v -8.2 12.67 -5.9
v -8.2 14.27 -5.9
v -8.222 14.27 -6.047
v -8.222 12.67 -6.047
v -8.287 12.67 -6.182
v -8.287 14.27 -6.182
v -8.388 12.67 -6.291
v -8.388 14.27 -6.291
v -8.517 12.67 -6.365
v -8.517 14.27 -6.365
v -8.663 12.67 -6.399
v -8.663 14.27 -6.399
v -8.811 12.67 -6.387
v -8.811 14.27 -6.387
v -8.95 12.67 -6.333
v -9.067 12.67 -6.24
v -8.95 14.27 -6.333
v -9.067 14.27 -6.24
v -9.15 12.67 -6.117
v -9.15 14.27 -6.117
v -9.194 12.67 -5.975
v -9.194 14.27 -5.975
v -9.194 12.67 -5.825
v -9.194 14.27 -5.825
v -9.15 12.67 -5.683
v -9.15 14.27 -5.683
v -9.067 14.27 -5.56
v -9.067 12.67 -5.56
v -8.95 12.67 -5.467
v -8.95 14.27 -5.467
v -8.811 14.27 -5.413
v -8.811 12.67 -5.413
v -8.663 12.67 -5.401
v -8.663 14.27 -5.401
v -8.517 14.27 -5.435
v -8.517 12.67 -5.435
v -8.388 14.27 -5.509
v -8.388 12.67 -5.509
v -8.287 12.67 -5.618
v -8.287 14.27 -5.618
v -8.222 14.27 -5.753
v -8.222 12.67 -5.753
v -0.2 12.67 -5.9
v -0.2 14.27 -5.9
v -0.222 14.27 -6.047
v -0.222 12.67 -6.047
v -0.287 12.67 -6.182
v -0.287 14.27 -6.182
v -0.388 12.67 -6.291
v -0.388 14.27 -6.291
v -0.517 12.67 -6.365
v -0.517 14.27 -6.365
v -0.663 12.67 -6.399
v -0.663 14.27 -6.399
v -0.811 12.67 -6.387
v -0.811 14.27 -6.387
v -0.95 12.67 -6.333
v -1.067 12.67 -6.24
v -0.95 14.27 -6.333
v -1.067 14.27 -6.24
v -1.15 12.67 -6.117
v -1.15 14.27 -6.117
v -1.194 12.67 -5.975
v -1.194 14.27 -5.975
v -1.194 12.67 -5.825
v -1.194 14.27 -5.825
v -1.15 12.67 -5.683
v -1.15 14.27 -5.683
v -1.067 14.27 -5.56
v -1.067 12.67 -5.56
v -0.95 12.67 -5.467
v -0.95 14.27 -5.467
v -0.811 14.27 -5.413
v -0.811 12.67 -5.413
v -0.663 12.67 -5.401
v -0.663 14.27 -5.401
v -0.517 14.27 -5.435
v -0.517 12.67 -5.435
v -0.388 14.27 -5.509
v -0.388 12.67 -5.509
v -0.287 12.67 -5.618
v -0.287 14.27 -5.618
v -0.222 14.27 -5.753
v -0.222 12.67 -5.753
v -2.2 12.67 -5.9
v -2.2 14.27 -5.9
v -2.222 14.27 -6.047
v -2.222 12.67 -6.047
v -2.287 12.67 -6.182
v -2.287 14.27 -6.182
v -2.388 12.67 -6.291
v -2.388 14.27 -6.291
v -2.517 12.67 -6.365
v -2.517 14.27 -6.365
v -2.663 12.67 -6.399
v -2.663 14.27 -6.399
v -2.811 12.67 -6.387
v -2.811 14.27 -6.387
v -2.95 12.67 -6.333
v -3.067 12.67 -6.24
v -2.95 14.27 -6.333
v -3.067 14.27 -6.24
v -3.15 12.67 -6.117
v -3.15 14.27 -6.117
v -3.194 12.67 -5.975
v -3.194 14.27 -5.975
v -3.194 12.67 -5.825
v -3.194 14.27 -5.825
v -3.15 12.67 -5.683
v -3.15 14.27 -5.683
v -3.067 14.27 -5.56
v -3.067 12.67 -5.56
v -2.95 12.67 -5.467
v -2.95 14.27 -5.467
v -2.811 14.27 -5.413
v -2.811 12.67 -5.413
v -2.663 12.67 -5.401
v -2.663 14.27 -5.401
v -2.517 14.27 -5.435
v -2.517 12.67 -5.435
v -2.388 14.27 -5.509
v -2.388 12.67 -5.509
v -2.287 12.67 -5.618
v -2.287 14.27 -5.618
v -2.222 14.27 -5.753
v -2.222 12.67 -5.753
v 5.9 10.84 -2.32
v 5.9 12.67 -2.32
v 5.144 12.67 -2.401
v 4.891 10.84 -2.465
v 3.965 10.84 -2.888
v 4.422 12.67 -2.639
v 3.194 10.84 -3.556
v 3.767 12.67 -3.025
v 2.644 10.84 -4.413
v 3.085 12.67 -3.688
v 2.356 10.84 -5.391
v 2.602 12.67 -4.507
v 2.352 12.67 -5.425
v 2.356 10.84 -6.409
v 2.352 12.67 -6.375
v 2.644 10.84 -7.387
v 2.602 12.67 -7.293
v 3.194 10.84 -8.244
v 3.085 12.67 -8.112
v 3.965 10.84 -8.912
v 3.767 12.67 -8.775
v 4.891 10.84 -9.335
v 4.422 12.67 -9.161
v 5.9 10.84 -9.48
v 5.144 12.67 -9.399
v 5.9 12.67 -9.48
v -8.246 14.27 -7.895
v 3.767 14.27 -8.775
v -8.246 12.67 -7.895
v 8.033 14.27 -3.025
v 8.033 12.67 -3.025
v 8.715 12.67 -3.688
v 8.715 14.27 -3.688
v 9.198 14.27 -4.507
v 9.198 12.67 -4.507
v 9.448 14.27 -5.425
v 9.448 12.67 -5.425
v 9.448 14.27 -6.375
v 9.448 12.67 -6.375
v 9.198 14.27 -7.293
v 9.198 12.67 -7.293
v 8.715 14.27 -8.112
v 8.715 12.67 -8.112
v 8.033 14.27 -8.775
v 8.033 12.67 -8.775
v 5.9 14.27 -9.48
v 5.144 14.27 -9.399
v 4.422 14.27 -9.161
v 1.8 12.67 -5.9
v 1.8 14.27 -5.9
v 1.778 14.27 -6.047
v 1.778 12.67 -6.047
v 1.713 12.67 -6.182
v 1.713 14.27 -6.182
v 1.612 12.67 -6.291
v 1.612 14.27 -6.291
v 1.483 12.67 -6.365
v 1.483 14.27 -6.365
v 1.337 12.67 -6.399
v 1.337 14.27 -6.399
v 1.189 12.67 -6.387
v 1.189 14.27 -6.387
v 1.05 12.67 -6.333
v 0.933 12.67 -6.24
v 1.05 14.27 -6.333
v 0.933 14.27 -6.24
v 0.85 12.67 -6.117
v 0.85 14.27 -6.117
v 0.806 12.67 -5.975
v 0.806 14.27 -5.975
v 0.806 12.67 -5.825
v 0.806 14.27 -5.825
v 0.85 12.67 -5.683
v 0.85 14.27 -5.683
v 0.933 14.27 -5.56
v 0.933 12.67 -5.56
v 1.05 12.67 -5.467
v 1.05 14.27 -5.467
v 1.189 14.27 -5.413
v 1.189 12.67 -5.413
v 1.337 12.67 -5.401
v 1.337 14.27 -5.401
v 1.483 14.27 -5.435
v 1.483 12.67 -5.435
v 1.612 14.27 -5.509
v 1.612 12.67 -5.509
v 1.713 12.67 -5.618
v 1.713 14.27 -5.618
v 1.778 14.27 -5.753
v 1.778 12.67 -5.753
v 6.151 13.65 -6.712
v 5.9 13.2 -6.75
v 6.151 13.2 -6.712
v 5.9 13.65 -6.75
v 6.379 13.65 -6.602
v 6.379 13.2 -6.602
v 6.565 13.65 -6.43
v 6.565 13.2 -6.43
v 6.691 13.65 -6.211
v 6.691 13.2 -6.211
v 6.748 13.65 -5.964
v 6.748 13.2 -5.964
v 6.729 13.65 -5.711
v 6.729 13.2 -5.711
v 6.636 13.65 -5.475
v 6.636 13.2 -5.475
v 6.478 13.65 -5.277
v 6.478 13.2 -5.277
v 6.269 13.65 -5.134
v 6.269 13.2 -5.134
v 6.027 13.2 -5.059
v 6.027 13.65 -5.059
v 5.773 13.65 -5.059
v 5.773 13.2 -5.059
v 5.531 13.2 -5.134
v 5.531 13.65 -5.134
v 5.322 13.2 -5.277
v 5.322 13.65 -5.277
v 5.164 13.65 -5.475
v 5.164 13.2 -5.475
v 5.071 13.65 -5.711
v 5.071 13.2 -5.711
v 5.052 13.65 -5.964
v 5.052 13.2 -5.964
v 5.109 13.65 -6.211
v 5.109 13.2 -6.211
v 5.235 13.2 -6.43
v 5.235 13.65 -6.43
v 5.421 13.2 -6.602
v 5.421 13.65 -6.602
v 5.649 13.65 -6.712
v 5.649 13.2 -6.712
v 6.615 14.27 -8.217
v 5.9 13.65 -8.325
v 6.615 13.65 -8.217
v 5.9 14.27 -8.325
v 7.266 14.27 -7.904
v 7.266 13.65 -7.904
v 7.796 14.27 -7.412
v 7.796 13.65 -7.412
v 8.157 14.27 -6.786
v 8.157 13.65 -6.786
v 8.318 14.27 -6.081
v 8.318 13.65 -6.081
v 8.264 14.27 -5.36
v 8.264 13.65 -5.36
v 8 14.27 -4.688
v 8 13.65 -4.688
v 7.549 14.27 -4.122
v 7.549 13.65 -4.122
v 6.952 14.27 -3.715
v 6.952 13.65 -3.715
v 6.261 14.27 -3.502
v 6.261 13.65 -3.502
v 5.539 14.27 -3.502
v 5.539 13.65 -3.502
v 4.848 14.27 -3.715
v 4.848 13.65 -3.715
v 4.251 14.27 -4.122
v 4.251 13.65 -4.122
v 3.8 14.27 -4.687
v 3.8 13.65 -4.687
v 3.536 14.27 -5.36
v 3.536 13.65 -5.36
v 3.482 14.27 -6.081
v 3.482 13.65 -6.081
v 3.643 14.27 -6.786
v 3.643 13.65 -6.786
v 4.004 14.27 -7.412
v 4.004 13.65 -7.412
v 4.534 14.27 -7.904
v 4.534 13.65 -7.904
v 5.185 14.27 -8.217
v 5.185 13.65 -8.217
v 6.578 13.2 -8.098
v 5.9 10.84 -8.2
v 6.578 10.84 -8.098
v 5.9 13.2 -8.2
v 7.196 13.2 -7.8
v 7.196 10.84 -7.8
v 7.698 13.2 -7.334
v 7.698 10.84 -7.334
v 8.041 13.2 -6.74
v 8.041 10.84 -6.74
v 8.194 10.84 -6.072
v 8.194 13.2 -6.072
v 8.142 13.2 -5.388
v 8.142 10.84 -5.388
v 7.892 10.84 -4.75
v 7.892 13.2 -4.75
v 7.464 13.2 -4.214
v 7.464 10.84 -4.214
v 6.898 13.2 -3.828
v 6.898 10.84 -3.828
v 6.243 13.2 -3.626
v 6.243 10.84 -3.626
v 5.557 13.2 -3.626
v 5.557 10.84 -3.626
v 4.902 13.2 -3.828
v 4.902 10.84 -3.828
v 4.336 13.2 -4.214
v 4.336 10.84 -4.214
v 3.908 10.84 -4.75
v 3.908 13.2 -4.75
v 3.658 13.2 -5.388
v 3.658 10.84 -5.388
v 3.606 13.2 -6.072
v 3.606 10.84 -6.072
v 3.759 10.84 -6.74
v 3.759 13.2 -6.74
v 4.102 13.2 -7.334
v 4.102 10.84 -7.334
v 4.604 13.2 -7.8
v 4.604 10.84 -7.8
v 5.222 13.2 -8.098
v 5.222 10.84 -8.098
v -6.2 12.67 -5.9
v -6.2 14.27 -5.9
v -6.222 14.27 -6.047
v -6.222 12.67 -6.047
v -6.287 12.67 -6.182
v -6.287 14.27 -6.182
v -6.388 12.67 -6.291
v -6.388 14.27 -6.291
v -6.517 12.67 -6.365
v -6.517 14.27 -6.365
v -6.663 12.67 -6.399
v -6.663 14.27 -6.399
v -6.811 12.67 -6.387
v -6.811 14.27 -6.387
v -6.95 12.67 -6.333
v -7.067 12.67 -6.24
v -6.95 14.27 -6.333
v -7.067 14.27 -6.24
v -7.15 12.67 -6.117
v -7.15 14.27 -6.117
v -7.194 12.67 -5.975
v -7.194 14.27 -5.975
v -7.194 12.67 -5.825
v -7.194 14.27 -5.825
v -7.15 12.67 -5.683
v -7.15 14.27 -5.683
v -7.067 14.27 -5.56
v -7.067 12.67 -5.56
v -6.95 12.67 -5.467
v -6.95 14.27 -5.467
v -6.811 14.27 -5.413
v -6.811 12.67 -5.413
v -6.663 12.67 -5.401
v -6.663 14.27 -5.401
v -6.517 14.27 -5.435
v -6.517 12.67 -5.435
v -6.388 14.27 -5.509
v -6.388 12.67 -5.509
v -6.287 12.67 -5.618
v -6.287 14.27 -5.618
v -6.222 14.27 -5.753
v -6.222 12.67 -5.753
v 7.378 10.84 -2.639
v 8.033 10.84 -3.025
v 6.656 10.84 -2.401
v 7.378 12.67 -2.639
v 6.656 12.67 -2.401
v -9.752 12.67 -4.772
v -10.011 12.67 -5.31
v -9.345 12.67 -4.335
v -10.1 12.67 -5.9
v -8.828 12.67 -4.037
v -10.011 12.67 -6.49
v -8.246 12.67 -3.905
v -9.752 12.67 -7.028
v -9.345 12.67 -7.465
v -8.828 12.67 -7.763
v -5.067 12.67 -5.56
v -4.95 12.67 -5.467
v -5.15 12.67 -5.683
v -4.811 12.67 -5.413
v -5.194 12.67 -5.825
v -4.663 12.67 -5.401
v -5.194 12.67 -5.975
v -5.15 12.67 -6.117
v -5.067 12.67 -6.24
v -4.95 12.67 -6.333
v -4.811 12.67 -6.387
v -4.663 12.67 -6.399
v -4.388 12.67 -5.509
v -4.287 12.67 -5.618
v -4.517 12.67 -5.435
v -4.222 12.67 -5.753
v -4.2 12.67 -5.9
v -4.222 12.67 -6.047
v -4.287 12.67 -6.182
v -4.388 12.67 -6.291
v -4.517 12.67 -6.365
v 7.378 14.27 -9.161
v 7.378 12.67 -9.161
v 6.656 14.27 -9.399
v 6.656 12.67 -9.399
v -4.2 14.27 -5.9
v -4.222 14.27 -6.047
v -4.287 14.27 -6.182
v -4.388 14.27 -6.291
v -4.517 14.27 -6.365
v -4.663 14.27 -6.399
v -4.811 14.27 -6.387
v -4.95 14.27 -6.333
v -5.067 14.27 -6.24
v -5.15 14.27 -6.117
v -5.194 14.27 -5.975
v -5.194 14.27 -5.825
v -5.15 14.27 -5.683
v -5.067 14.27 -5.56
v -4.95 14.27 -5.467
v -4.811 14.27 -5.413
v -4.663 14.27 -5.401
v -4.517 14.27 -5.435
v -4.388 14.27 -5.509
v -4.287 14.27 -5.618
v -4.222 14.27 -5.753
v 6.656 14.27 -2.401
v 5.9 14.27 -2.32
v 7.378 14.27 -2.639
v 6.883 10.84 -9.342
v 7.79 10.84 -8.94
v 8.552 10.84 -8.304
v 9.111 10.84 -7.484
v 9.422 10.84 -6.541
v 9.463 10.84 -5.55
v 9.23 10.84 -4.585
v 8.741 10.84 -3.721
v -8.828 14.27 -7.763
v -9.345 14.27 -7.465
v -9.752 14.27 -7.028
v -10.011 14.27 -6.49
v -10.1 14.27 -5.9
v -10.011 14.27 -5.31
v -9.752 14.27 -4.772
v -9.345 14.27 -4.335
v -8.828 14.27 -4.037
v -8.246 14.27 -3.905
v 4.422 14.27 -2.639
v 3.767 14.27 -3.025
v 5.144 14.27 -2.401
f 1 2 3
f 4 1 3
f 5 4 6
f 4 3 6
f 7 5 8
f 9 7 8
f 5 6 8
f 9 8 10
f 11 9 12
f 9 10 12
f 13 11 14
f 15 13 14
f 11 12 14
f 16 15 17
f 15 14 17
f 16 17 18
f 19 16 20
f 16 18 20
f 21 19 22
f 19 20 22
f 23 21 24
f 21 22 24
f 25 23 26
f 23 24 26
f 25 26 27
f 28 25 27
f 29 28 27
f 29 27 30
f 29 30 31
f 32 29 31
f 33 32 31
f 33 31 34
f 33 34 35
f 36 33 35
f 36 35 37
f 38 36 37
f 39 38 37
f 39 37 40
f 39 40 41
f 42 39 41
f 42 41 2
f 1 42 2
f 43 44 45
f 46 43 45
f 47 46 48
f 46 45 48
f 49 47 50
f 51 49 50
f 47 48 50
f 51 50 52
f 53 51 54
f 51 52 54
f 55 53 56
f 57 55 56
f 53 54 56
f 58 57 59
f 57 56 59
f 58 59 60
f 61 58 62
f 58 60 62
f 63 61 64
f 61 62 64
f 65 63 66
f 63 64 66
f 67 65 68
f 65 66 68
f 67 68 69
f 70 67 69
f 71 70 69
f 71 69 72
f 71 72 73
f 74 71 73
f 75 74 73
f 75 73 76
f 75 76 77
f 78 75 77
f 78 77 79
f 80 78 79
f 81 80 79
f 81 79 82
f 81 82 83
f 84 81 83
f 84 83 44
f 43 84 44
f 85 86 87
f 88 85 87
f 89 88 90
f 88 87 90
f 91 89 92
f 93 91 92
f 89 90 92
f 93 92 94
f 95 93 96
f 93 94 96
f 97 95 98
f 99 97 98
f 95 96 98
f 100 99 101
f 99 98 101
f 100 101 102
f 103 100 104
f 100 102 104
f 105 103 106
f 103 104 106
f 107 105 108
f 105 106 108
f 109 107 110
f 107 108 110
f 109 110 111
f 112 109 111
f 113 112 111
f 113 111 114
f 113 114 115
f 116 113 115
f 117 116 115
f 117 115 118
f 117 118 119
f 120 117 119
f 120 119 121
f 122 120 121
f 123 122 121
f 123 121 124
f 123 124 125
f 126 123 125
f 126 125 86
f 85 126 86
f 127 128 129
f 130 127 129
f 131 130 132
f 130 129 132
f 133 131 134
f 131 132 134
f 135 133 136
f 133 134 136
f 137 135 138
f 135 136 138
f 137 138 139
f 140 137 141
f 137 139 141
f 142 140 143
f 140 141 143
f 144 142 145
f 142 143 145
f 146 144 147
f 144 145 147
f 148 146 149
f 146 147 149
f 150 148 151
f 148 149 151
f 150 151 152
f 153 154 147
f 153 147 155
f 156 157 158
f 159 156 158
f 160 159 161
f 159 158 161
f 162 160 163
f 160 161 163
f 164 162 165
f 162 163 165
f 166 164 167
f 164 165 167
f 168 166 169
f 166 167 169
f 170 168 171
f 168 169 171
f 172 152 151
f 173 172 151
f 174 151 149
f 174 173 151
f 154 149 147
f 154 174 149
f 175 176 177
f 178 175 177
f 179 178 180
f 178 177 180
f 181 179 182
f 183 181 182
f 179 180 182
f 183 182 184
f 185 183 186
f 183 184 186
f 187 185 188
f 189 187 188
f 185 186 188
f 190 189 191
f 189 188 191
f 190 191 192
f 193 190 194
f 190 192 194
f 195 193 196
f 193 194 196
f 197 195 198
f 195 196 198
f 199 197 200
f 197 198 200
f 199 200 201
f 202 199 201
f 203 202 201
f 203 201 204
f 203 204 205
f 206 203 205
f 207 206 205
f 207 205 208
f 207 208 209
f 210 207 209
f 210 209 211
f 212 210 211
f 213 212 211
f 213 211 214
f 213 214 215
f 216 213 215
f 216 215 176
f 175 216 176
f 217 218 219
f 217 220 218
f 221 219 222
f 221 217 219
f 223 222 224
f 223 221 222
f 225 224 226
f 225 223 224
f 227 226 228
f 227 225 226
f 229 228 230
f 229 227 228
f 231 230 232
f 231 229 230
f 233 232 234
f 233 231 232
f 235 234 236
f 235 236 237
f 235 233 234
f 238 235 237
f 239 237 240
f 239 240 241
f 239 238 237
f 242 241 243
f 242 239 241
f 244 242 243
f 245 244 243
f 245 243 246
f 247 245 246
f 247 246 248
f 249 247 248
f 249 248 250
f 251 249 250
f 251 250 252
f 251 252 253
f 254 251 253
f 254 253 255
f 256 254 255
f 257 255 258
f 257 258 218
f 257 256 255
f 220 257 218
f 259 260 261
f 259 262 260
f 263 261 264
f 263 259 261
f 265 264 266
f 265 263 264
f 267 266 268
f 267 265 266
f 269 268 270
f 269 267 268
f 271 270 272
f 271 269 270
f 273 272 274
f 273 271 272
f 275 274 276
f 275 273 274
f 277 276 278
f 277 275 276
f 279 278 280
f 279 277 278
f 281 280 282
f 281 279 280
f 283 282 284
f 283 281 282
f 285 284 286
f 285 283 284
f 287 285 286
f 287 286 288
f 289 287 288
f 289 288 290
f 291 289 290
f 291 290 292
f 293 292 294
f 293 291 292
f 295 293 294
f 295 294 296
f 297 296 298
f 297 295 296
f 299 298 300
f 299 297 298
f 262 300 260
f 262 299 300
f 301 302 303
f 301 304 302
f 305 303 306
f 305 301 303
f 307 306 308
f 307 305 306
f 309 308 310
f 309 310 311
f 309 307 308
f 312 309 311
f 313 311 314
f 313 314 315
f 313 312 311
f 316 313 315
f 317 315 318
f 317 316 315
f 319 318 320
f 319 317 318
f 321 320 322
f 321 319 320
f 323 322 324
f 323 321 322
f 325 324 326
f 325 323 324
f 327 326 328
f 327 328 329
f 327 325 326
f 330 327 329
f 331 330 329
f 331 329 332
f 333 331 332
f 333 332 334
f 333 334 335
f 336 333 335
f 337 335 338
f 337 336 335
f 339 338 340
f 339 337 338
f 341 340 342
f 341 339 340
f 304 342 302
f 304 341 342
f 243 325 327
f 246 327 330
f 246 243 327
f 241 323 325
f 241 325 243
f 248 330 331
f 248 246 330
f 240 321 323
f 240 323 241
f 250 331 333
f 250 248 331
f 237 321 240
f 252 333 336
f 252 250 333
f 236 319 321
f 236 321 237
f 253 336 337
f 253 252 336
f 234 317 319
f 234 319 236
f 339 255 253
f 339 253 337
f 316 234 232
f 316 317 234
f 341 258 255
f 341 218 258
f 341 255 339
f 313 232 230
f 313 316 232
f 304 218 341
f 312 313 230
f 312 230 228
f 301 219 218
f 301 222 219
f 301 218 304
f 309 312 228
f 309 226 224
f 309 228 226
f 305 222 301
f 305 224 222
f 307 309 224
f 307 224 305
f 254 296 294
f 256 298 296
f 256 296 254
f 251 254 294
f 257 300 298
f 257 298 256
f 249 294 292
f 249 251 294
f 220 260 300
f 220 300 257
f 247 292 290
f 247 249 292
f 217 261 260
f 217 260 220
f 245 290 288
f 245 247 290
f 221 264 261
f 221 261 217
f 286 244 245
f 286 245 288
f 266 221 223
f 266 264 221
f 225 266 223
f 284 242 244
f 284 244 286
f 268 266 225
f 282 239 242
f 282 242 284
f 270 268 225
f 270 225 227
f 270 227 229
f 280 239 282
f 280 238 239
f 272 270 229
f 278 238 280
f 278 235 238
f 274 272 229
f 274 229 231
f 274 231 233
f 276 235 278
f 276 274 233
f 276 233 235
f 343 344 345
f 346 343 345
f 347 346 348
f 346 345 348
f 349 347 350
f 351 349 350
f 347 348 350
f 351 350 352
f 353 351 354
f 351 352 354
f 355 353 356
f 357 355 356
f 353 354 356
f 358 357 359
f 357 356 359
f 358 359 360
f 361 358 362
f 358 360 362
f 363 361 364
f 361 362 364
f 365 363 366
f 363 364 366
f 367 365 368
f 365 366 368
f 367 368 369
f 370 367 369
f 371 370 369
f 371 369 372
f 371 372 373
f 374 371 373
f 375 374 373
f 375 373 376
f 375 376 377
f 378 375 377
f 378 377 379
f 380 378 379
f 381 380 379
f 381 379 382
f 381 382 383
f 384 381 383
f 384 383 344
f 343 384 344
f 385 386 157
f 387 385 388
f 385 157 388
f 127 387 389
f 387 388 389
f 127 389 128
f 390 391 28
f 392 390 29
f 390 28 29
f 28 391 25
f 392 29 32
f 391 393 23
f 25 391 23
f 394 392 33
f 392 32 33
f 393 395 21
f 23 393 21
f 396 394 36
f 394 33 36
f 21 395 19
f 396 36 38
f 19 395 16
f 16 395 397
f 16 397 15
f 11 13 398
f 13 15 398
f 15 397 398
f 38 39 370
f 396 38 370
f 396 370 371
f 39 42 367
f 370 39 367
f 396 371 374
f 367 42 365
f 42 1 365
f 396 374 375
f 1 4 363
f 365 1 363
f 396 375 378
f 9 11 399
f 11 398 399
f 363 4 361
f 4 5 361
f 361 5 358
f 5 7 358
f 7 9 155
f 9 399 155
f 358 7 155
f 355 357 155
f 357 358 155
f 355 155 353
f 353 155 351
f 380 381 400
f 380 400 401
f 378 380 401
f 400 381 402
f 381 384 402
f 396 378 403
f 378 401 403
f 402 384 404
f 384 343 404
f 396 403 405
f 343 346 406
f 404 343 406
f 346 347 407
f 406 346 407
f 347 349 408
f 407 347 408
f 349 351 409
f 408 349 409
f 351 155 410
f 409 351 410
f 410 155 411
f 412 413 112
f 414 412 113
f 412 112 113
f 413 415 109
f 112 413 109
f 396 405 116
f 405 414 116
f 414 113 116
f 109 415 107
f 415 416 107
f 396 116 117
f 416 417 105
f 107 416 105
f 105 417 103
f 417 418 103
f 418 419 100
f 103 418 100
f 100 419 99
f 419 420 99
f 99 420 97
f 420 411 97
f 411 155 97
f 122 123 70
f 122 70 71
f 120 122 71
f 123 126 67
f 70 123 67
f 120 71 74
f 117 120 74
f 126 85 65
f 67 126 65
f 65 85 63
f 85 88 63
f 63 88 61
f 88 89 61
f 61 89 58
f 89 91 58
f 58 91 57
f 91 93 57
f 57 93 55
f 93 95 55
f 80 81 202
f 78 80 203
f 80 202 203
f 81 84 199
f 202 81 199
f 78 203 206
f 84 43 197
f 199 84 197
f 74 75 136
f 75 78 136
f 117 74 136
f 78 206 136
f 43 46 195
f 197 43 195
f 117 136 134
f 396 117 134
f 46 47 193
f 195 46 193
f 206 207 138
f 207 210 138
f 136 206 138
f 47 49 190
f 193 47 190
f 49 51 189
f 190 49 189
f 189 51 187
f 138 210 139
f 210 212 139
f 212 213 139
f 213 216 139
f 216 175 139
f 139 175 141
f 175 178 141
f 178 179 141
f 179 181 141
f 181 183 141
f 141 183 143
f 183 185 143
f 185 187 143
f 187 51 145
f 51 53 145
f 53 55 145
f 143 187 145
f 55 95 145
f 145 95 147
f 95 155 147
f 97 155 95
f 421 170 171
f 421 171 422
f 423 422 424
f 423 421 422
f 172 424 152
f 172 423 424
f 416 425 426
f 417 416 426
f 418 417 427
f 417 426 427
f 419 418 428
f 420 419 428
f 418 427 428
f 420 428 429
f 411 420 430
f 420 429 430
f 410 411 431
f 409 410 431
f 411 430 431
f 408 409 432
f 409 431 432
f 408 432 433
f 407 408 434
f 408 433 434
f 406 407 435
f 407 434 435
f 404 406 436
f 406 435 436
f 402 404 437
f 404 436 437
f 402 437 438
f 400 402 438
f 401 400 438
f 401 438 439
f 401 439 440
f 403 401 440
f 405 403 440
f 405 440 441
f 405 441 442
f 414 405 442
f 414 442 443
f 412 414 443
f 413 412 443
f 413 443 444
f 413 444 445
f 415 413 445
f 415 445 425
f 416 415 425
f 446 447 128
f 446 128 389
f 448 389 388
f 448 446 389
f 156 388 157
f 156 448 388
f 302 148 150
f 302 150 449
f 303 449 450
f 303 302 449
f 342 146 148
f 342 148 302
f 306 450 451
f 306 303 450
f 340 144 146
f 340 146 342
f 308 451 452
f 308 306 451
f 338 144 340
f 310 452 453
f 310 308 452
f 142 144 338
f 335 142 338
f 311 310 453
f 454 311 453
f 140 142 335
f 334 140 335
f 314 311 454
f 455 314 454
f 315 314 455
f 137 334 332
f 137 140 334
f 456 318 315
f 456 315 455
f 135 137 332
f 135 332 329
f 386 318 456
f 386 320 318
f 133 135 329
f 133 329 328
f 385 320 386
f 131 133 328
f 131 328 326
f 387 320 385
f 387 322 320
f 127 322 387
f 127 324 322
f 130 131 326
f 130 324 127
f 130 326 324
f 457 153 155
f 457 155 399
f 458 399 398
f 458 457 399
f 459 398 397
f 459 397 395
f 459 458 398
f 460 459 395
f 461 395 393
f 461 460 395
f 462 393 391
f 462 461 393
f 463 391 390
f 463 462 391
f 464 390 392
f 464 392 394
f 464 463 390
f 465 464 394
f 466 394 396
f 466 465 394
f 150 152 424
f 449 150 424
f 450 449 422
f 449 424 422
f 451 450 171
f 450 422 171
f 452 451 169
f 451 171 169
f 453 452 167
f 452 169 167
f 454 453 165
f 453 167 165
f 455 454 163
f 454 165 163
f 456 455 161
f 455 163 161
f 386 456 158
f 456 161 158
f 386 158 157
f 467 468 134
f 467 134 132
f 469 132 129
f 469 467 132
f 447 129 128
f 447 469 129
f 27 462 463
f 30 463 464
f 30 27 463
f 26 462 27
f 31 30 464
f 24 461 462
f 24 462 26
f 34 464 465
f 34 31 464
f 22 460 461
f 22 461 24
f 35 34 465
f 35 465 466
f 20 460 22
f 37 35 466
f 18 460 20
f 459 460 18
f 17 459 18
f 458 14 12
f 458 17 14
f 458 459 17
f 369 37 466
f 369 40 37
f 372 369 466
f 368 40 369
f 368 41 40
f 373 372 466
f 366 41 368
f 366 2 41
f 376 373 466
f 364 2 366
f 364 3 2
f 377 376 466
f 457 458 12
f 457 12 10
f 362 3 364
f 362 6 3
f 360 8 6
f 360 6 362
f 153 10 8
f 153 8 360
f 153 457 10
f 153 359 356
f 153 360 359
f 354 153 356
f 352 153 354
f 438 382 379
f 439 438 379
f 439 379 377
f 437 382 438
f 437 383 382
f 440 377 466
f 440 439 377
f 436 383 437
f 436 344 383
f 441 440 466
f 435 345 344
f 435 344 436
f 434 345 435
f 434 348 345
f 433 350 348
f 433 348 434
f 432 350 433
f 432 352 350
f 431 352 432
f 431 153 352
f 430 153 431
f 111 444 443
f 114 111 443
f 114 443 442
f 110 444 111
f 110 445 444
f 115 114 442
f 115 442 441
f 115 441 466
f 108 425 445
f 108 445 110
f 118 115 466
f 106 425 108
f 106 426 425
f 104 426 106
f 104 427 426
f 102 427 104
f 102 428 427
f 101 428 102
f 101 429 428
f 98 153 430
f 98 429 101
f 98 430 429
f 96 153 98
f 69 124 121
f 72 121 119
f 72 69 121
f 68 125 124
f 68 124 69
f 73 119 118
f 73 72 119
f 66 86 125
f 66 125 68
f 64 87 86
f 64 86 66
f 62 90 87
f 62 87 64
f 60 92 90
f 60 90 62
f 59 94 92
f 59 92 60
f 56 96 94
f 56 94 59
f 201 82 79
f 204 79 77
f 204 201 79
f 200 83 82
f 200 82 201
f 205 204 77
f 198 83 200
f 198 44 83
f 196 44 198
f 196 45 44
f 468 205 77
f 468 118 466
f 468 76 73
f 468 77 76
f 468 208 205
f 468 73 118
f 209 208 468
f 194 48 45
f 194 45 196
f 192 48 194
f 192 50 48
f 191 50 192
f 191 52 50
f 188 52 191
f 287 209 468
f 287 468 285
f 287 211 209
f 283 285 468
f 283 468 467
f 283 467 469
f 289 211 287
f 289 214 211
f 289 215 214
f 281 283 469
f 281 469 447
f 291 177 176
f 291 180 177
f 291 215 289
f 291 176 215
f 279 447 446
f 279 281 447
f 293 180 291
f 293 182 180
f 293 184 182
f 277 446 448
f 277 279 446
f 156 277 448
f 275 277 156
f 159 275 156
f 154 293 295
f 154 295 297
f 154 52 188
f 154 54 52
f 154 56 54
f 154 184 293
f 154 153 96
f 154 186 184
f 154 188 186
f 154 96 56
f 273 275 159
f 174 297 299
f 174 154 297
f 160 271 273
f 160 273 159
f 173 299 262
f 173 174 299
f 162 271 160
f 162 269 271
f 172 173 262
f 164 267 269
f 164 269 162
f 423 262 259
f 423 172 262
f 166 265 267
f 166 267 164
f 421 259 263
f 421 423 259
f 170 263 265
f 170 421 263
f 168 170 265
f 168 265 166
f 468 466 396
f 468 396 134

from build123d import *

# Parameters (mm, degrees)
SALIENTE_EXTRUIR1_DEPTH       = 1.6
CROQUIS2_R                    = 3.58
SALIENTE_EXTRUIR2_DEPTH       = 1.83
DI_METRO_DE_TALADRO_1_0_1_1_D = 1
CORTAR_EXTRUIR1_DEPTH         = 25.109029429


with BuildPart() as part:
    # Croquis1 → Saliente-Extruir1 (new body)
    with BuildSketch(Plane(origin=(0, 14.27, 0), x_dir=(1, 0, 0), z_dir=(0, 1, 0))):
        with BuildLine():
            Line((8.033254556, 3.025), (20.046175024, 3.905348937))
            ThreePointArc((20.046175024, 3.905348937), (21.9, 5.9), (20.046175024, 7.894651063))
            Line((20.046175024, 7.894651063), (8.033254556, 8.775))
            ThreePointArc((8.033254556, 8.775), (5.9, 9.48), (3.766745444, 8.775))
            Line((3.766745444, 8.775), (-8.246175024, 7.894651063))
            ThreePointArc((-8.246175024, 7.894651063), (-10.1, 5.9), (-8.246175024, 3.905348937))
            Line((-8.246175024, 3.905348937), (3.766745444, 3.025))
            ThreePointArc((3.766745444, 3.025), (5.9, 2.32), (8.033254556, 3.025))
        make_face()
    extrude(amount=-SALIENTE_EXTRUIR1_DEPTH)

    # Croquis2 → Saliente-Extruir2 (add)
    with BuildSketch(Plane.XZ.offset(-12.67)):
        with Locations((5.9, -5.9)):
            Circle(CROQUIS2_R)
    extrude(amount=SALIENTE_EXTRUIR2_DEPTH)

    # Croquis3 → Cortar-Revolución1 (revolve, cut)
    with BuildSketch(Plane.XY.offset(-5.9)):
        Polygon((8.325, 14.27), (5.9, 14.27), (5.9, 10.84), (8.2, 10.84), (8.2, 13.2), (6.75, 13.2), (6.75, 13.65), (8.325, 13.65), align=None)
    revolve(axis=Axis((5.9, 14.27, -5.9), (0, -1, 0)), mode=Mode.SUBTRACT)

    # Diámetro de taladro Ø1.0 (1)1 (through all)
    with Locations(Plane(origin=(0, 12.67, 0), x_dir=(-1, 0, 0), z_dir=(0, -1, 0))):
        with Locations((2.7, 5.9), (6.7, 5.9), (8.7, 5.9), (4.7, 5.9), (0.7, 5.9), (-10.5, 5.9), (-14.5, 5.9), (-18.5, 5.9), (-20.5, 5.9), (-16.5, 5.9), (-12.5, 5.9), (-1.3, 5.9)):
            Hole(DI_METRO_DE_TALADRO_1_0_1_1_D / 2)

    # Croquis6 → Cortar-Extruir1 (cut, through all)
    with BuildSketch(Plane.XZ.offset(-10.84)):
        with BuildLine():
            Line((5.9, -9.48), (5.9, -13.293160377))
            Line((5.9, -13.293160377), (27.115989236, -13.293160377))
            Line((27.115989236, -13.293160377), (27.115989236, 2.204986014))
            Line((27.115989236, 2.204986014), (5.9, 2.204986014))
            Line((5.9, 2.204986014), (5.9, -2.32))
            ThreePointArc((5.9, -2.32), (9.48, -5.9), (5.9, -9.48))
        make_face()
    extrude(amount=-CORTAR_EXTRUIR1_DEPTH, mode=Mode.SUBTRACT)


solid = part.part
